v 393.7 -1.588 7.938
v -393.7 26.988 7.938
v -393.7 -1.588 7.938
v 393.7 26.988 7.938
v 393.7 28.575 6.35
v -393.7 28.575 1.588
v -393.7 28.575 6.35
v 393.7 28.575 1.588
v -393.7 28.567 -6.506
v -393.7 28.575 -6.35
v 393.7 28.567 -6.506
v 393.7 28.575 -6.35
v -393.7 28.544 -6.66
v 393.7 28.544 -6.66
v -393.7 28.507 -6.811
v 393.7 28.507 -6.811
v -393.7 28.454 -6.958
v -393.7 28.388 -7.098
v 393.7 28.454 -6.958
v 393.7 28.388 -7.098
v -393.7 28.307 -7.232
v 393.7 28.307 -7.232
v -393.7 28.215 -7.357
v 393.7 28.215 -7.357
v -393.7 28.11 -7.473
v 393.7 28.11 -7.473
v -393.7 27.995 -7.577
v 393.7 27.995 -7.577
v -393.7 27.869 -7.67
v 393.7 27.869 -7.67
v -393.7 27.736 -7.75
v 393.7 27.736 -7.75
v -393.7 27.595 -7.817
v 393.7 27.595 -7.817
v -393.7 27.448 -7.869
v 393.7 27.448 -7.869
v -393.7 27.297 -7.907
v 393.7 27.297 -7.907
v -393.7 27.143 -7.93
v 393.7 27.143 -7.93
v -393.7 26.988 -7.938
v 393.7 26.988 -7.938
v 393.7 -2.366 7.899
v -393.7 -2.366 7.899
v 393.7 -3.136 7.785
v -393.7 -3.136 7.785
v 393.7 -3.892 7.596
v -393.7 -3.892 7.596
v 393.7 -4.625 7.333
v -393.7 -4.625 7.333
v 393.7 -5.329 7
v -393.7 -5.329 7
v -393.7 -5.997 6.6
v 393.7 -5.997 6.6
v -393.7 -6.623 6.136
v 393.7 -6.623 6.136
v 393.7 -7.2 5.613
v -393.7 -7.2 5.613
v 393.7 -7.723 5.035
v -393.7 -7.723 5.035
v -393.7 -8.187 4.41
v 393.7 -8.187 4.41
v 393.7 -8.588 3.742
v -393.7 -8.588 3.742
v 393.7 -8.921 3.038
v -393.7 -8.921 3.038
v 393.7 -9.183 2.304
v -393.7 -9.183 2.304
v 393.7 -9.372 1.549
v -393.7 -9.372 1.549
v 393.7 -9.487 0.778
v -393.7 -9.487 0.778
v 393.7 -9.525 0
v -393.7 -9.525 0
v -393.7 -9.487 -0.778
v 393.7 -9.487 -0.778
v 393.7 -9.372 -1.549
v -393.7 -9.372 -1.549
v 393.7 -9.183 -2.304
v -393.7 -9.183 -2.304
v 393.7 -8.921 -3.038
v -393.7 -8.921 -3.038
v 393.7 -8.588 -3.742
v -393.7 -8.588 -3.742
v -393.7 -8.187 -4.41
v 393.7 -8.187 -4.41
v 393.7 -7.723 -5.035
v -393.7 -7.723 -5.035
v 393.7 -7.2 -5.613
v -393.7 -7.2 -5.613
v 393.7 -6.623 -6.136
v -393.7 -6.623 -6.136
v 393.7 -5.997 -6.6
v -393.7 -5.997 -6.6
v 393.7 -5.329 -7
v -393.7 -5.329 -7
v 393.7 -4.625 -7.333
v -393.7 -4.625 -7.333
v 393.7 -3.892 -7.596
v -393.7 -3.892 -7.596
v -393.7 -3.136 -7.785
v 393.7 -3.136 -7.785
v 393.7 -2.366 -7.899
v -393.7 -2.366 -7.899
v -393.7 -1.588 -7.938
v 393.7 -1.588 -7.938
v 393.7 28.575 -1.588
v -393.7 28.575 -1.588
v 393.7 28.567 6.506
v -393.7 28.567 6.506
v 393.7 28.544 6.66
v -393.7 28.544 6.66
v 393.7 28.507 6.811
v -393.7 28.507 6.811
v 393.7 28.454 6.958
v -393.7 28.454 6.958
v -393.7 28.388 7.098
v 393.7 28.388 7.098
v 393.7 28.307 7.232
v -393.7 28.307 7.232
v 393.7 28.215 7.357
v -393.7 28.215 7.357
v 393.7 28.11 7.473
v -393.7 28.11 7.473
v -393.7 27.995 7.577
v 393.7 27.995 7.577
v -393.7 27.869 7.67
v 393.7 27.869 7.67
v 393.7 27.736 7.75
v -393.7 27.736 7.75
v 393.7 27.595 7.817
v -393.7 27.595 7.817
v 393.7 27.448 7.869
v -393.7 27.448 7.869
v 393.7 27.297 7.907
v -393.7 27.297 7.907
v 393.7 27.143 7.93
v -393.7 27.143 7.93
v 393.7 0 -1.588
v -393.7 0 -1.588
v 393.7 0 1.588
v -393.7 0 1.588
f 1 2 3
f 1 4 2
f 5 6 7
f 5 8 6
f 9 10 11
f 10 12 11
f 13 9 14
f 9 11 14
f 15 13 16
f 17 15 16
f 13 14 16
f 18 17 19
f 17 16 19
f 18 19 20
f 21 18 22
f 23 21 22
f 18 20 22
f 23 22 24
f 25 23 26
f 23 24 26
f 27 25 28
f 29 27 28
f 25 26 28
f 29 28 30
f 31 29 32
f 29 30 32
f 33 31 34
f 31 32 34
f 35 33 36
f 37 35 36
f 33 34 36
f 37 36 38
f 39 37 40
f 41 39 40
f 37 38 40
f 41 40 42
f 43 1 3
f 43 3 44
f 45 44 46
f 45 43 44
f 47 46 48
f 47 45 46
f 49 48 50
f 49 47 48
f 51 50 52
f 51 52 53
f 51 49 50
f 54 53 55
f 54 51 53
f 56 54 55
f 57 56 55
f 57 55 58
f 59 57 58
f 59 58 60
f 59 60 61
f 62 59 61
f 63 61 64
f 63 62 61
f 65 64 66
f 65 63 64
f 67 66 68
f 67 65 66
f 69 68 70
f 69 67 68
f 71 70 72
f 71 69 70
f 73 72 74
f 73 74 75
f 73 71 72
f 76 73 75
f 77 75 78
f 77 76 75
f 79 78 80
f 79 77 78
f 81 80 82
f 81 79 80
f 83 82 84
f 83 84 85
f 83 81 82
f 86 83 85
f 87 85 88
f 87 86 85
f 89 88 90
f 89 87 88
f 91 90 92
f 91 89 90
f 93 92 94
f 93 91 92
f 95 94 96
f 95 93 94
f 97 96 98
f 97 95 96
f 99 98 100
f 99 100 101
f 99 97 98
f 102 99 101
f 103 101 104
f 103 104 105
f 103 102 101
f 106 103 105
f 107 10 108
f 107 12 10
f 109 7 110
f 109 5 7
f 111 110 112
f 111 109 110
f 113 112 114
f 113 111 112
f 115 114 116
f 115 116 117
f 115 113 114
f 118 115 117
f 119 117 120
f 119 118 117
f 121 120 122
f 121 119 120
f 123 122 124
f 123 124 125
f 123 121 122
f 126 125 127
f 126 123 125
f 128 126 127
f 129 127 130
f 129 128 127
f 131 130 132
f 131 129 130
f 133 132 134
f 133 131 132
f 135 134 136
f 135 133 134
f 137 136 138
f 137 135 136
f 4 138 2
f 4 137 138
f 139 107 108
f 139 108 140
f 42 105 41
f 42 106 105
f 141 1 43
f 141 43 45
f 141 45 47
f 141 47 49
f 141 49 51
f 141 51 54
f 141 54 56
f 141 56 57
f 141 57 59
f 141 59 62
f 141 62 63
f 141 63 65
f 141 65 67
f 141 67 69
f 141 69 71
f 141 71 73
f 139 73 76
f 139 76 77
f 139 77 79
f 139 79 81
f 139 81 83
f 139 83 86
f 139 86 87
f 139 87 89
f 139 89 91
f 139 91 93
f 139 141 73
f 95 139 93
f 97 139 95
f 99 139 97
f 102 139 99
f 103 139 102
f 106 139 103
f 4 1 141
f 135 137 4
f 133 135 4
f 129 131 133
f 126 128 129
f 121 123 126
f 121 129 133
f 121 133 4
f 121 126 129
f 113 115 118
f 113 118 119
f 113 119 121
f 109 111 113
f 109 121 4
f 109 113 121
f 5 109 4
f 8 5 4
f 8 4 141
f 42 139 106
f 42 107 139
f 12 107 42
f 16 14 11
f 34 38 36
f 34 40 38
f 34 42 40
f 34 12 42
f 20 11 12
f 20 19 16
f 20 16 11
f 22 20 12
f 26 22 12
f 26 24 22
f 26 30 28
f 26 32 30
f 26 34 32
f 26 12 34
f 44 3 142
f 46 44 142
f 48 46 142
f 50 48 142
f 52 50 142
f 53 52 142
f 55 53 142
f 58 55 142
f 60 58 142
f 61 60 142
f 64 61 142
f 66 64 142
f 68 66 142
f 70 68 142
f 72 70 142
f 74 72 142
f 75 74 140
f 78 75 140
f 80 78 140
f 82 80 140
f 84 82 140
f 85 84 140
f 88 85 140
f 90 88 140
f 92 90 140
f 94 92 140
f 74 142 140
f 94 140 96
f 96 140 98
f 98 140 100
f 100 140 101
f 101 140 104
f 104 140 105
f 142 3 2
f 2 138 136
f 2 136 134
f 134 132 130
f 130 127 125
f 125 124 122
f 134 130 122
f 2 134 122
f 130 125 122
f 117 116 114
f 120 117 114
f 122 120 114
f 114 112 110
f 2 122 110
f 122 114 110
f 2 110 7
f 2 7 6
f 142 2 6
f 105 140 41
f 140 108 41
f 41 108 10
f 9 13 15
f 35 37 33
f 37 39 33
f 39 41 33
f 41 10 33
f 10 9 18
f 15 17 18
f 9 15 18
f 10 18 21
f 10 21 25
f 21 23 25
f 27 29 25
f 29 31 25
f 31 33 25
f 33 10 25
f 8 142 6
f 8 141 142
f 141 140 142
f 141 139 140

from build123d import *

# Parameters (mm, degrees)
BOSS_EXTRUDE1_DEPTH = 393.7
FILLET1_R           = 1.5875


with BuildPart() as part:
    # Sketch1 → Boss-Extrude1 (new body, symmetric)
    with BuildSketch(Plane(origin=(0, 0, 0), x_dir=(0, 0, -1), z_dir=(1, 0, 0))):
        with BuildLine():
            Line((-1.5875, 28.575), (-7.9375, 28.575))
            Line((-7.9375, 28.575), (-7.9375, -1.5875))
            ThreePointArc((-7.9375, -1.5875), (0, -9.525), (7.9375, -1.5875))
            Line((7.9375, -1.5875), (7.9375, 28.575))
            Line((7.9375, 28.575), (1.5875, 28.575))
            Line((1.5875, 28.575), (1.5875, 0))
            Line((1.5875, 0), (-1.5875, 0))
            Line((-1.5875, 0), (-1.5875, 28.575))
        make_face()
    extrude(amount=BOSS_EXTRUDE1_DEPTH, both=True)

    # Fillet1
    fillet1_edges = [part.edges().sort_by_distance(p)[0] for p in [
        (0, 28.575, -7.9375),
        (0, 28.575, 7.9375),
    ]]
    fillet(fillet1_edges, radius=FILLET1_R)


solid = part.part
